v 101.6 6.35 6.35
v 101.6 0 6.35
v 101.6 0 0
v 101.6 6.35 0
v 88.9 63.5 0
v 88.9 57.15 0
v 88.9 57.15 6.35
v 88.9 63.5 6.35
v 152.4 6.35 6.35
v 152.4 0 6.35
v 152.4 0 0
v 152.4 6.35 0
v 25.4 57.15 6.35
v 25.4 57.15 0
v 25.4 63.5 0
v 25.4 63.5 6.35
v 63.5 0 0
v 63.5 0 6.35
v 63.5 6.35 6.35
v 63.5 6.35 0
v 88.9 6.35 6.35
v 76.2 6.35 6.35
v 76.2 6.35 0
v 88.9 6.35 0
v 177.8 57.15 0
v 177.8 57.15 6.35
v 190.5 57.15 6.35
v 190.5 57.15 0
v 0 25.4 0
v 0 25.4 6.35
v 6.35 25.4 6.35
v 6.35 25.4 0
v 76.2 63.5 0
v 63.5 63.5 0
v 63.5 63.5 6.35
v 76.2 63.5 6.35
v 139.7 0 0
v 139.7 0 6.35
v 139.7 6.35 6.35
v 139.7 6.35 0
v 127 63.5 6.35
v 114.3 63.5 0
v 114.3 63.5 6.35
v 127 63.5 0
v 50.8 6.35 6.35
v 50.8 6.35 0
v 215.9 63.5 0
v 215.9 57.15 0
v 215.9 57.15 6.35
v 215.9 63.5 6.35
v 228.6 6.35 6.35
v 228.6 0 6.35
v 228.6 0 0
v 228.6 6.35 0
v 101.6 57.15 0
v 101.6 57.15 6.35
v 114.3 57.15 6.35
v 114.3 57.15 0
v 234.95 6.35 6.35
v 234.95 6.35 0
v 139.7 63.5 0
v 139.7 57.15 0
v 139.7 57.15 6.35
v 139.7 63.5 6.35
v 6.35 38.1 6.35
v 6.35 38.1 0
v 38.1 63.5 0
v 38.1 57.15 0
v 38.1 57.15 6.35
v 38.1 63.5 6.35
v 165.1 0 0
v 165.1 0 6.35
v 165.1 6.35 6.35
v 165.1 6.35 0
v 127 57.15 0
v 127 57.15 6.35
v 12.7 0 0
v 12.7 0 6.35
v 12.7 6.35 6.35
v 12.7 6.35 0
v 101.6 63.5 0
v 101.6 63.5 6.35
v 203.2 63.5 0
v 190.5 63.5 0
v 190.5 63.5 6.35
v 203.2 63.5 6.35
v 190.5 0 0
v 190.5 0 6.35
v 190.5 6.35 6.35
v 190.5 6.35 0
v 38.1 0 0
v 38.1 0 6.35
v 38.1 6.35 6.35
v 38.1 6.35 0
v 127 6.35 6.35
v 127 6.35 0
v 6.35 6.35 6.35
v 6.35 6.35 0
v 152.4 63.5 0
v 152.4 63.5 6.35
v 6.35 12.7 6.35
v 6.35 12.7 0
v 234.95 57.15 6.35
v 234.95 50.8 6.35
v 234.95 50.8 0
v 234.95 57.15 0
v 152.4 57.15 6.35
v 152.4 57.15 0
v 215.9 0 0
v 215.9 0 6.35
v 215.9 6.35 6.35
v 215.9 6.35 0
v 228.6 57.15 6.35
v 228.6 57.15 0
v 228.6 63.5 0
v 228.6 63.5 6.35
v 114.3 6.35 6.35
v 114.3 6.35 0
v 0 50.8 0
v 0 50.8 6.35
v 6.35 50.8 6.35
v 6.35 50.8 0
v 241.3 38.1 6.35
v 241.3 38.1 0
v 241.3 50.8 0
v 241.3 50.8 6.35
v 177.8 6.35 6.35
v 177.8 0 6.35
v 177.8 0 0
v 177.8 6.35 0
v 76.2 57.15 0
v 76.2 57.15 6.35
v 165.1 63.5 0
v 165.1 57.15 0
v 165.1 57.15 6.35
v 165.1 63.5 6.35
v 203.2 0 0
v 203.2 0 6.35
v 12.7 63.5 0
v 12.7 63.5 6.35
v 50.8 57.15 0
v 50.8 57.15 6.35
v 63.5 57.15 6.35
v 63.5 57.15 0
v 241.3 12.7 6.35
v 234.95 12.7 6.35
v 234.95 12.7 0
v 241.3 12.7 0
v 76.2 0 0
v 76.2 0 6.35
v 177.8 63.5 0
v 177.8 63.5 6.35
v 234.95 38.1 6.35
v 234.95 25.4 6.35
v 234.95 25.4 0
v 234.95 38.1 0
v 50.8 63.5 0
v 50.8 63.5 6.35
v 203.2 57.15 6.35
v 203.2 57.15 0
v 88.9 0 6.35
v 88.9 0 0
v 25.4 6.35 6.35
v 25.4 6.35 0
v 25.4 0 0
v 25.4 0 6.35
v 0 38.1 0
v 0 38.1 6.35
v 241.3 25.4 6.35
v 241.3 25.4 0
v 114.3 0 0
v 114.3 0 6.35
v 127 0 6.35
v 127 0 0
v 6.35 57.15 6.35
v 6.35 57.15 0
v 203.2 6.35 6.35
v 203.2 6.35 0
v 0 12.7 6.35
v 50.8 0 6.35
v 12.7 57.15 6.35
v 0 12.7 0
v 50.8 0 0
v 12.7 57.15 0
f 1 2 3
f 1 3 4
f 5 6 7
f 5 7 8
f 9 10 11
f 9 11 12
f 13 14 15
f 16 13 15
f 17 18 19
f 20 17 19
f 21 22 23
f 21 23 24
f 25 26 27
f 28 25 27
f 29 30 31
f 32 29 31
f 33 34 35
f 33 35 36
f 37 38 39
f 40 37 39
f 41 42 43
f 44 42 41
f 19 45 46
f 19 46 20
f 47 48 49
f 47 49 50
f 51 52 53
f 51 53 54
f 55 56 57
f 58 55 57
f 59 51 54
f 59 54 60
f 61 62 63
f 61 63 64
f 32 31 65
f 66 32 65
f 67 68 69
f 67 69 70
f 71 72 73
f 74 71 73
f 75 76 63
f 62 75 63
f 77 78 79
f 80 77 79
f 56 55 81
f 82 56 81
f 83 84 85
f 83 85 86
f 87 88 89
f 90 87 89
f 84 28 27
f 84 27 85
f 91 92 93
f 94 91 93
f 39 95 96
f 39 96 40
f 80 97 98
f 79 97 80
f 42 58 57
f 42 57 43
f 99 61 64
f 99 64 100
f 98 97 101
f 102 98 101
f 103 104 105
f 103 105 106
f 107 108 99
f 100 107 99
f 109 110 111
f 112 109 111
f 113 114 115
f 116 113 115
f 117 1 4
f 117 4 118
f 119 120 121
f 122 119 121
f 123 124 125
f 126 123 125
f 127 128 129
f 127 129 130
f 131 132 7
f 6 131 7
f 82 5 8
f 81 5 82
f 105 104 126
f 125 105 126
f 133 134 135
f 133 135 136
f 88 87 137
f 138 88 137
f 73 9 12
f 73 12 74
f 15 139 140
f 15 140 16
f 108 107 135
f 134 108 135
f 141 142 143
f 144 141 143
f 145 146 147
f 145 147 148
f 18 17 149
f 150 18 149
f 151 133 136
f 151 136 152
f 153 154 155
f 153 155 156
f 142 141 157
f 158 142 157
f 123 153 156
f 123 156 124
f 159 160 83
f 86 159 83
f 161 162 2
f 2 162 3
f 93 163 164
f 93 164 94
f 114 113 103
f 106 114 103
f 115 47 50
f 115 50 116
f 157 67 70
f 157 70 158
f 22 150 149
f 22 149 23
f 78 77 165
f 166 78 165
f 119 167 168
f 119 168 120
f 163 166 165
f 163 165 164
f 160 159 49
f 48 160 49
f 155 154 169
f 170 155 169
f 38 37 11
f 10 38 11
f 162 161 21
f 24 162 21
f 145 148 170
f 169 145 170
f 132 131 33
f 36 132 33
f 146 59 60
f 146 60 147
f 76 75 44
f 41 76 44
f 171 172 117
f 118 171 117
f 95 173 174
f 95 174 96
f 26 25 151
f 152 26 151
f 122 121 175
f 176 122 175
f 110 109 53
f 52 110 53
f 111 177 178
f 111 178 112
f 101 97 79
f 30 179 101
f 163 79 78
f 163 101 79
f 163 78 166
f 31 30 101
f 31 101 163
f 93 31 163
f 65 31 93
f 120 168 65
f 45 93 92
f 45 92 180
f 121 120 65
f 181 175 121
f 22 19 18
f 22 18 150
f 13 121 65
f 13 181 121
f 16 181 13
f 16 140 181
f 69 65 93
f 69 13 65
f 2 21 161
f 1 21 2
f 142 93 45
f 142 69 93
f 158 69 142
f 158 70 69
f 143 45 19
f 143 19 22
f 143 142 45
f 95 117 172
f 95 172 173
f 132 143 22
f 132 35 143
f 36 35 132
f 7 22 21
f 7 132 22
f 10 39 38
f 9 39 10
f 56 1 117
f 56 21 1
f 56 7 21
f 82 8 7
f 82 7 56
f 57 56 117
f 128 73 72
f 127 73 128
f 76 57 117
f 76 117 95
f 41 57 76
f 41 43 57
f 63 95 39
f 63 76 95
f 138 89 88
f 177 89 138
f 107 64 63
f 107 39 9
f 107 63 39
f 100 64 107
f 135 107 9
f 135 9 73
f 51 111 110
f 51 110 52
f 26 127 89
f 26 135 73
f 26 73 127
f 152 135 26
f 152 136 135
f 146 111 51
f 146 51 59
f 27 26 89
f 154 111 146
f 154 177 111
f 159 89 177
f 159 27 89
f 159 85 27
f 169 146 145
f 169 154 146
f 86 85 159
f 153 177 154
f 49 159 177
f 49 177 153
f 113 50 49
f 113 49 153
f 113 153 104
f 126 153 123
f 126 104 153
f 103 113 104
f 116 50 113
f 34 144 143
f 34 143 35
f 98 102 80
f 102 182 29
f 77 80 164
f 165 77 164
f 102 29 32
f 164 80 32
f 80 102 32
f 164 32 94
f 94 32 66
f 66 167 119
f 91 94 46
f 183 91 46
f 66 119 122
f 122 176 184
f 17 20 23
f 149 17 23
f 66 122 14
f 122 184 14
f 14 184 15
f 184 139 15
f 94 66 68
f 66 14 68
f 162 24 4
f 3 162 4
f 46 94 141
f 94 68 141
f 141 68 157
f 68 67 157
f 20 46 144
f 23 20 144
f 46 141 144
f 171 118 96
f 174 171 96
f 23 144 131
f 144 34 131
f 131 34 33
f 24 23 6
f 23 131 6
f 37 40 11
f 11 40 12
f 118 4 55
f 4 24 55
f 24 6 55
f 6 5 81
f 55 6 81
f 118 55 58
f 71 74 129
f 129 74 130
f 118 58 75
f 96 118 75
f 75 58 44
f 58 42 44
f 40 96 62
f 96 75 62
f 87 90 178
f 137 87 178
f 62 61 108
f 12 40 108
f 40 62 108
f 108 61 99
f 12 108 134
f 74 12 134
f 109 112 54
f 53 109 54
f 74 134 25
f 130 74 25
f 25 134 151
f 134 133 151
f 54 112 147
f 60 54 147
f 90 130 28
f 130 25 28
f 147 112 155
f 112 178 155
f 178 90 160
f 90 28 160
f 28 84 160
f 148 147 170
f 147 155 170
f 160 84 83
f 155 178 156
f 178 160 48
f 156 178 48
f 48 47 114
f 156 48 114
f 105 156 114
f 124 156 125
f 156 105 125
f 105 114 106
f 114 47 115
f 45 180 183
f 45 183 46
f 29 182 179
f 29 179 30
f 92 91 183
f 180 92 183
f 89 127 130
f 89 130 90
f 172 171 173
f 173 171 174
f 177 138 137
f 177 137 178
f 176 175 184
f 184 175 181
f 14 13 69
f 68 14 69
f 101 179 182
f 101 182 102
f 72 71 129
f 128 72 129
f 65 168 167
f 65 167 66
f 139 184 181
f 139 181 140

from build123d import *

# Parameters (mm, degrees)
SKETCH2_W           = 241.3
SKETCH2_H           = 63.5
BOSS_EXTRUDE1_DEPTH = 6.35
SKETCH3_W           = 6.35
SKETCH3_H           = 12.7
CUT_EXTRUDE1_DEPTH  = 7.35
LPATTERN1_COUNT     = 3
LPATTERN1_PITCH     = 25.4
SKETCH4_W           = 12.7
SKETCH4_H           = 6.35
CUT_EXTRUDE2_DEPTH  = 7.35
LPATTERN2_COUNT     = 10
LPATTERN2_PITCH     = 25.4


with BuildPart() as part:
    # Sketch2 → Boss-Extrude1 (new body)
    with BuildSketch(Plane.XY):
        with Locations((120.65, 31.75)):
            Rectangle(SKETCH2_W, SKETCH2_H)
    extrude(amount=BOSS_EXTRUDE1_DEPTH)

    # Sketch3 → Cut-Extrude1 (cut, through all)
    with BuildSketch(Plane.XY.offset(6.35)):
        with Locations((3.175, 57.15)):
            Rectangle(SKETCH3_W, SKETCH3_H)
        with Locations((238.125, 57.15)):
            Rectangle(SKETCH3_W, SKETCH3_H)
    cut_extrude1 = extrude(amount=-CUT_EXTRUDE1_DEPTH, mode=Mode.SUBTRACT)

    # LPattern1: Cut-Extrude1 ×3
    with Locations(*[(0, -i * LPATTERN1_PITCH, 0) for i in range(1, LPATTERN1_COUNT)]):
        add(cut_extrude1, mode=Mode.SUBTRACT)

    # Sketch4 → Cut-Extrude2 (cut, through all)
    with BuildSketch(Plane.XY.offset(6.35)):
        with Locations((6.35, 60.325)):
            Rectangle(SKETCH4_W, SKETCH4_H)
        with Locations((6.35, 3.175)):
            Rectangle(SKETCH4_W, SKETCH4_H)
    cut_extrude2 = extrude(amount=-CUT_EXTRUDE2_DEPTH, mode=Mode.SUBTRACT)

    # LPattern2: Cut-Extrude2 ×10
    with Locations(*[(i * LPATTERN2_PITCH, 0, 0) for i in range(1, LPATTERN2_COUNT)]):
        add(cut_extrude2, mode=Mode.SUBTRACT)


solid = part.part
